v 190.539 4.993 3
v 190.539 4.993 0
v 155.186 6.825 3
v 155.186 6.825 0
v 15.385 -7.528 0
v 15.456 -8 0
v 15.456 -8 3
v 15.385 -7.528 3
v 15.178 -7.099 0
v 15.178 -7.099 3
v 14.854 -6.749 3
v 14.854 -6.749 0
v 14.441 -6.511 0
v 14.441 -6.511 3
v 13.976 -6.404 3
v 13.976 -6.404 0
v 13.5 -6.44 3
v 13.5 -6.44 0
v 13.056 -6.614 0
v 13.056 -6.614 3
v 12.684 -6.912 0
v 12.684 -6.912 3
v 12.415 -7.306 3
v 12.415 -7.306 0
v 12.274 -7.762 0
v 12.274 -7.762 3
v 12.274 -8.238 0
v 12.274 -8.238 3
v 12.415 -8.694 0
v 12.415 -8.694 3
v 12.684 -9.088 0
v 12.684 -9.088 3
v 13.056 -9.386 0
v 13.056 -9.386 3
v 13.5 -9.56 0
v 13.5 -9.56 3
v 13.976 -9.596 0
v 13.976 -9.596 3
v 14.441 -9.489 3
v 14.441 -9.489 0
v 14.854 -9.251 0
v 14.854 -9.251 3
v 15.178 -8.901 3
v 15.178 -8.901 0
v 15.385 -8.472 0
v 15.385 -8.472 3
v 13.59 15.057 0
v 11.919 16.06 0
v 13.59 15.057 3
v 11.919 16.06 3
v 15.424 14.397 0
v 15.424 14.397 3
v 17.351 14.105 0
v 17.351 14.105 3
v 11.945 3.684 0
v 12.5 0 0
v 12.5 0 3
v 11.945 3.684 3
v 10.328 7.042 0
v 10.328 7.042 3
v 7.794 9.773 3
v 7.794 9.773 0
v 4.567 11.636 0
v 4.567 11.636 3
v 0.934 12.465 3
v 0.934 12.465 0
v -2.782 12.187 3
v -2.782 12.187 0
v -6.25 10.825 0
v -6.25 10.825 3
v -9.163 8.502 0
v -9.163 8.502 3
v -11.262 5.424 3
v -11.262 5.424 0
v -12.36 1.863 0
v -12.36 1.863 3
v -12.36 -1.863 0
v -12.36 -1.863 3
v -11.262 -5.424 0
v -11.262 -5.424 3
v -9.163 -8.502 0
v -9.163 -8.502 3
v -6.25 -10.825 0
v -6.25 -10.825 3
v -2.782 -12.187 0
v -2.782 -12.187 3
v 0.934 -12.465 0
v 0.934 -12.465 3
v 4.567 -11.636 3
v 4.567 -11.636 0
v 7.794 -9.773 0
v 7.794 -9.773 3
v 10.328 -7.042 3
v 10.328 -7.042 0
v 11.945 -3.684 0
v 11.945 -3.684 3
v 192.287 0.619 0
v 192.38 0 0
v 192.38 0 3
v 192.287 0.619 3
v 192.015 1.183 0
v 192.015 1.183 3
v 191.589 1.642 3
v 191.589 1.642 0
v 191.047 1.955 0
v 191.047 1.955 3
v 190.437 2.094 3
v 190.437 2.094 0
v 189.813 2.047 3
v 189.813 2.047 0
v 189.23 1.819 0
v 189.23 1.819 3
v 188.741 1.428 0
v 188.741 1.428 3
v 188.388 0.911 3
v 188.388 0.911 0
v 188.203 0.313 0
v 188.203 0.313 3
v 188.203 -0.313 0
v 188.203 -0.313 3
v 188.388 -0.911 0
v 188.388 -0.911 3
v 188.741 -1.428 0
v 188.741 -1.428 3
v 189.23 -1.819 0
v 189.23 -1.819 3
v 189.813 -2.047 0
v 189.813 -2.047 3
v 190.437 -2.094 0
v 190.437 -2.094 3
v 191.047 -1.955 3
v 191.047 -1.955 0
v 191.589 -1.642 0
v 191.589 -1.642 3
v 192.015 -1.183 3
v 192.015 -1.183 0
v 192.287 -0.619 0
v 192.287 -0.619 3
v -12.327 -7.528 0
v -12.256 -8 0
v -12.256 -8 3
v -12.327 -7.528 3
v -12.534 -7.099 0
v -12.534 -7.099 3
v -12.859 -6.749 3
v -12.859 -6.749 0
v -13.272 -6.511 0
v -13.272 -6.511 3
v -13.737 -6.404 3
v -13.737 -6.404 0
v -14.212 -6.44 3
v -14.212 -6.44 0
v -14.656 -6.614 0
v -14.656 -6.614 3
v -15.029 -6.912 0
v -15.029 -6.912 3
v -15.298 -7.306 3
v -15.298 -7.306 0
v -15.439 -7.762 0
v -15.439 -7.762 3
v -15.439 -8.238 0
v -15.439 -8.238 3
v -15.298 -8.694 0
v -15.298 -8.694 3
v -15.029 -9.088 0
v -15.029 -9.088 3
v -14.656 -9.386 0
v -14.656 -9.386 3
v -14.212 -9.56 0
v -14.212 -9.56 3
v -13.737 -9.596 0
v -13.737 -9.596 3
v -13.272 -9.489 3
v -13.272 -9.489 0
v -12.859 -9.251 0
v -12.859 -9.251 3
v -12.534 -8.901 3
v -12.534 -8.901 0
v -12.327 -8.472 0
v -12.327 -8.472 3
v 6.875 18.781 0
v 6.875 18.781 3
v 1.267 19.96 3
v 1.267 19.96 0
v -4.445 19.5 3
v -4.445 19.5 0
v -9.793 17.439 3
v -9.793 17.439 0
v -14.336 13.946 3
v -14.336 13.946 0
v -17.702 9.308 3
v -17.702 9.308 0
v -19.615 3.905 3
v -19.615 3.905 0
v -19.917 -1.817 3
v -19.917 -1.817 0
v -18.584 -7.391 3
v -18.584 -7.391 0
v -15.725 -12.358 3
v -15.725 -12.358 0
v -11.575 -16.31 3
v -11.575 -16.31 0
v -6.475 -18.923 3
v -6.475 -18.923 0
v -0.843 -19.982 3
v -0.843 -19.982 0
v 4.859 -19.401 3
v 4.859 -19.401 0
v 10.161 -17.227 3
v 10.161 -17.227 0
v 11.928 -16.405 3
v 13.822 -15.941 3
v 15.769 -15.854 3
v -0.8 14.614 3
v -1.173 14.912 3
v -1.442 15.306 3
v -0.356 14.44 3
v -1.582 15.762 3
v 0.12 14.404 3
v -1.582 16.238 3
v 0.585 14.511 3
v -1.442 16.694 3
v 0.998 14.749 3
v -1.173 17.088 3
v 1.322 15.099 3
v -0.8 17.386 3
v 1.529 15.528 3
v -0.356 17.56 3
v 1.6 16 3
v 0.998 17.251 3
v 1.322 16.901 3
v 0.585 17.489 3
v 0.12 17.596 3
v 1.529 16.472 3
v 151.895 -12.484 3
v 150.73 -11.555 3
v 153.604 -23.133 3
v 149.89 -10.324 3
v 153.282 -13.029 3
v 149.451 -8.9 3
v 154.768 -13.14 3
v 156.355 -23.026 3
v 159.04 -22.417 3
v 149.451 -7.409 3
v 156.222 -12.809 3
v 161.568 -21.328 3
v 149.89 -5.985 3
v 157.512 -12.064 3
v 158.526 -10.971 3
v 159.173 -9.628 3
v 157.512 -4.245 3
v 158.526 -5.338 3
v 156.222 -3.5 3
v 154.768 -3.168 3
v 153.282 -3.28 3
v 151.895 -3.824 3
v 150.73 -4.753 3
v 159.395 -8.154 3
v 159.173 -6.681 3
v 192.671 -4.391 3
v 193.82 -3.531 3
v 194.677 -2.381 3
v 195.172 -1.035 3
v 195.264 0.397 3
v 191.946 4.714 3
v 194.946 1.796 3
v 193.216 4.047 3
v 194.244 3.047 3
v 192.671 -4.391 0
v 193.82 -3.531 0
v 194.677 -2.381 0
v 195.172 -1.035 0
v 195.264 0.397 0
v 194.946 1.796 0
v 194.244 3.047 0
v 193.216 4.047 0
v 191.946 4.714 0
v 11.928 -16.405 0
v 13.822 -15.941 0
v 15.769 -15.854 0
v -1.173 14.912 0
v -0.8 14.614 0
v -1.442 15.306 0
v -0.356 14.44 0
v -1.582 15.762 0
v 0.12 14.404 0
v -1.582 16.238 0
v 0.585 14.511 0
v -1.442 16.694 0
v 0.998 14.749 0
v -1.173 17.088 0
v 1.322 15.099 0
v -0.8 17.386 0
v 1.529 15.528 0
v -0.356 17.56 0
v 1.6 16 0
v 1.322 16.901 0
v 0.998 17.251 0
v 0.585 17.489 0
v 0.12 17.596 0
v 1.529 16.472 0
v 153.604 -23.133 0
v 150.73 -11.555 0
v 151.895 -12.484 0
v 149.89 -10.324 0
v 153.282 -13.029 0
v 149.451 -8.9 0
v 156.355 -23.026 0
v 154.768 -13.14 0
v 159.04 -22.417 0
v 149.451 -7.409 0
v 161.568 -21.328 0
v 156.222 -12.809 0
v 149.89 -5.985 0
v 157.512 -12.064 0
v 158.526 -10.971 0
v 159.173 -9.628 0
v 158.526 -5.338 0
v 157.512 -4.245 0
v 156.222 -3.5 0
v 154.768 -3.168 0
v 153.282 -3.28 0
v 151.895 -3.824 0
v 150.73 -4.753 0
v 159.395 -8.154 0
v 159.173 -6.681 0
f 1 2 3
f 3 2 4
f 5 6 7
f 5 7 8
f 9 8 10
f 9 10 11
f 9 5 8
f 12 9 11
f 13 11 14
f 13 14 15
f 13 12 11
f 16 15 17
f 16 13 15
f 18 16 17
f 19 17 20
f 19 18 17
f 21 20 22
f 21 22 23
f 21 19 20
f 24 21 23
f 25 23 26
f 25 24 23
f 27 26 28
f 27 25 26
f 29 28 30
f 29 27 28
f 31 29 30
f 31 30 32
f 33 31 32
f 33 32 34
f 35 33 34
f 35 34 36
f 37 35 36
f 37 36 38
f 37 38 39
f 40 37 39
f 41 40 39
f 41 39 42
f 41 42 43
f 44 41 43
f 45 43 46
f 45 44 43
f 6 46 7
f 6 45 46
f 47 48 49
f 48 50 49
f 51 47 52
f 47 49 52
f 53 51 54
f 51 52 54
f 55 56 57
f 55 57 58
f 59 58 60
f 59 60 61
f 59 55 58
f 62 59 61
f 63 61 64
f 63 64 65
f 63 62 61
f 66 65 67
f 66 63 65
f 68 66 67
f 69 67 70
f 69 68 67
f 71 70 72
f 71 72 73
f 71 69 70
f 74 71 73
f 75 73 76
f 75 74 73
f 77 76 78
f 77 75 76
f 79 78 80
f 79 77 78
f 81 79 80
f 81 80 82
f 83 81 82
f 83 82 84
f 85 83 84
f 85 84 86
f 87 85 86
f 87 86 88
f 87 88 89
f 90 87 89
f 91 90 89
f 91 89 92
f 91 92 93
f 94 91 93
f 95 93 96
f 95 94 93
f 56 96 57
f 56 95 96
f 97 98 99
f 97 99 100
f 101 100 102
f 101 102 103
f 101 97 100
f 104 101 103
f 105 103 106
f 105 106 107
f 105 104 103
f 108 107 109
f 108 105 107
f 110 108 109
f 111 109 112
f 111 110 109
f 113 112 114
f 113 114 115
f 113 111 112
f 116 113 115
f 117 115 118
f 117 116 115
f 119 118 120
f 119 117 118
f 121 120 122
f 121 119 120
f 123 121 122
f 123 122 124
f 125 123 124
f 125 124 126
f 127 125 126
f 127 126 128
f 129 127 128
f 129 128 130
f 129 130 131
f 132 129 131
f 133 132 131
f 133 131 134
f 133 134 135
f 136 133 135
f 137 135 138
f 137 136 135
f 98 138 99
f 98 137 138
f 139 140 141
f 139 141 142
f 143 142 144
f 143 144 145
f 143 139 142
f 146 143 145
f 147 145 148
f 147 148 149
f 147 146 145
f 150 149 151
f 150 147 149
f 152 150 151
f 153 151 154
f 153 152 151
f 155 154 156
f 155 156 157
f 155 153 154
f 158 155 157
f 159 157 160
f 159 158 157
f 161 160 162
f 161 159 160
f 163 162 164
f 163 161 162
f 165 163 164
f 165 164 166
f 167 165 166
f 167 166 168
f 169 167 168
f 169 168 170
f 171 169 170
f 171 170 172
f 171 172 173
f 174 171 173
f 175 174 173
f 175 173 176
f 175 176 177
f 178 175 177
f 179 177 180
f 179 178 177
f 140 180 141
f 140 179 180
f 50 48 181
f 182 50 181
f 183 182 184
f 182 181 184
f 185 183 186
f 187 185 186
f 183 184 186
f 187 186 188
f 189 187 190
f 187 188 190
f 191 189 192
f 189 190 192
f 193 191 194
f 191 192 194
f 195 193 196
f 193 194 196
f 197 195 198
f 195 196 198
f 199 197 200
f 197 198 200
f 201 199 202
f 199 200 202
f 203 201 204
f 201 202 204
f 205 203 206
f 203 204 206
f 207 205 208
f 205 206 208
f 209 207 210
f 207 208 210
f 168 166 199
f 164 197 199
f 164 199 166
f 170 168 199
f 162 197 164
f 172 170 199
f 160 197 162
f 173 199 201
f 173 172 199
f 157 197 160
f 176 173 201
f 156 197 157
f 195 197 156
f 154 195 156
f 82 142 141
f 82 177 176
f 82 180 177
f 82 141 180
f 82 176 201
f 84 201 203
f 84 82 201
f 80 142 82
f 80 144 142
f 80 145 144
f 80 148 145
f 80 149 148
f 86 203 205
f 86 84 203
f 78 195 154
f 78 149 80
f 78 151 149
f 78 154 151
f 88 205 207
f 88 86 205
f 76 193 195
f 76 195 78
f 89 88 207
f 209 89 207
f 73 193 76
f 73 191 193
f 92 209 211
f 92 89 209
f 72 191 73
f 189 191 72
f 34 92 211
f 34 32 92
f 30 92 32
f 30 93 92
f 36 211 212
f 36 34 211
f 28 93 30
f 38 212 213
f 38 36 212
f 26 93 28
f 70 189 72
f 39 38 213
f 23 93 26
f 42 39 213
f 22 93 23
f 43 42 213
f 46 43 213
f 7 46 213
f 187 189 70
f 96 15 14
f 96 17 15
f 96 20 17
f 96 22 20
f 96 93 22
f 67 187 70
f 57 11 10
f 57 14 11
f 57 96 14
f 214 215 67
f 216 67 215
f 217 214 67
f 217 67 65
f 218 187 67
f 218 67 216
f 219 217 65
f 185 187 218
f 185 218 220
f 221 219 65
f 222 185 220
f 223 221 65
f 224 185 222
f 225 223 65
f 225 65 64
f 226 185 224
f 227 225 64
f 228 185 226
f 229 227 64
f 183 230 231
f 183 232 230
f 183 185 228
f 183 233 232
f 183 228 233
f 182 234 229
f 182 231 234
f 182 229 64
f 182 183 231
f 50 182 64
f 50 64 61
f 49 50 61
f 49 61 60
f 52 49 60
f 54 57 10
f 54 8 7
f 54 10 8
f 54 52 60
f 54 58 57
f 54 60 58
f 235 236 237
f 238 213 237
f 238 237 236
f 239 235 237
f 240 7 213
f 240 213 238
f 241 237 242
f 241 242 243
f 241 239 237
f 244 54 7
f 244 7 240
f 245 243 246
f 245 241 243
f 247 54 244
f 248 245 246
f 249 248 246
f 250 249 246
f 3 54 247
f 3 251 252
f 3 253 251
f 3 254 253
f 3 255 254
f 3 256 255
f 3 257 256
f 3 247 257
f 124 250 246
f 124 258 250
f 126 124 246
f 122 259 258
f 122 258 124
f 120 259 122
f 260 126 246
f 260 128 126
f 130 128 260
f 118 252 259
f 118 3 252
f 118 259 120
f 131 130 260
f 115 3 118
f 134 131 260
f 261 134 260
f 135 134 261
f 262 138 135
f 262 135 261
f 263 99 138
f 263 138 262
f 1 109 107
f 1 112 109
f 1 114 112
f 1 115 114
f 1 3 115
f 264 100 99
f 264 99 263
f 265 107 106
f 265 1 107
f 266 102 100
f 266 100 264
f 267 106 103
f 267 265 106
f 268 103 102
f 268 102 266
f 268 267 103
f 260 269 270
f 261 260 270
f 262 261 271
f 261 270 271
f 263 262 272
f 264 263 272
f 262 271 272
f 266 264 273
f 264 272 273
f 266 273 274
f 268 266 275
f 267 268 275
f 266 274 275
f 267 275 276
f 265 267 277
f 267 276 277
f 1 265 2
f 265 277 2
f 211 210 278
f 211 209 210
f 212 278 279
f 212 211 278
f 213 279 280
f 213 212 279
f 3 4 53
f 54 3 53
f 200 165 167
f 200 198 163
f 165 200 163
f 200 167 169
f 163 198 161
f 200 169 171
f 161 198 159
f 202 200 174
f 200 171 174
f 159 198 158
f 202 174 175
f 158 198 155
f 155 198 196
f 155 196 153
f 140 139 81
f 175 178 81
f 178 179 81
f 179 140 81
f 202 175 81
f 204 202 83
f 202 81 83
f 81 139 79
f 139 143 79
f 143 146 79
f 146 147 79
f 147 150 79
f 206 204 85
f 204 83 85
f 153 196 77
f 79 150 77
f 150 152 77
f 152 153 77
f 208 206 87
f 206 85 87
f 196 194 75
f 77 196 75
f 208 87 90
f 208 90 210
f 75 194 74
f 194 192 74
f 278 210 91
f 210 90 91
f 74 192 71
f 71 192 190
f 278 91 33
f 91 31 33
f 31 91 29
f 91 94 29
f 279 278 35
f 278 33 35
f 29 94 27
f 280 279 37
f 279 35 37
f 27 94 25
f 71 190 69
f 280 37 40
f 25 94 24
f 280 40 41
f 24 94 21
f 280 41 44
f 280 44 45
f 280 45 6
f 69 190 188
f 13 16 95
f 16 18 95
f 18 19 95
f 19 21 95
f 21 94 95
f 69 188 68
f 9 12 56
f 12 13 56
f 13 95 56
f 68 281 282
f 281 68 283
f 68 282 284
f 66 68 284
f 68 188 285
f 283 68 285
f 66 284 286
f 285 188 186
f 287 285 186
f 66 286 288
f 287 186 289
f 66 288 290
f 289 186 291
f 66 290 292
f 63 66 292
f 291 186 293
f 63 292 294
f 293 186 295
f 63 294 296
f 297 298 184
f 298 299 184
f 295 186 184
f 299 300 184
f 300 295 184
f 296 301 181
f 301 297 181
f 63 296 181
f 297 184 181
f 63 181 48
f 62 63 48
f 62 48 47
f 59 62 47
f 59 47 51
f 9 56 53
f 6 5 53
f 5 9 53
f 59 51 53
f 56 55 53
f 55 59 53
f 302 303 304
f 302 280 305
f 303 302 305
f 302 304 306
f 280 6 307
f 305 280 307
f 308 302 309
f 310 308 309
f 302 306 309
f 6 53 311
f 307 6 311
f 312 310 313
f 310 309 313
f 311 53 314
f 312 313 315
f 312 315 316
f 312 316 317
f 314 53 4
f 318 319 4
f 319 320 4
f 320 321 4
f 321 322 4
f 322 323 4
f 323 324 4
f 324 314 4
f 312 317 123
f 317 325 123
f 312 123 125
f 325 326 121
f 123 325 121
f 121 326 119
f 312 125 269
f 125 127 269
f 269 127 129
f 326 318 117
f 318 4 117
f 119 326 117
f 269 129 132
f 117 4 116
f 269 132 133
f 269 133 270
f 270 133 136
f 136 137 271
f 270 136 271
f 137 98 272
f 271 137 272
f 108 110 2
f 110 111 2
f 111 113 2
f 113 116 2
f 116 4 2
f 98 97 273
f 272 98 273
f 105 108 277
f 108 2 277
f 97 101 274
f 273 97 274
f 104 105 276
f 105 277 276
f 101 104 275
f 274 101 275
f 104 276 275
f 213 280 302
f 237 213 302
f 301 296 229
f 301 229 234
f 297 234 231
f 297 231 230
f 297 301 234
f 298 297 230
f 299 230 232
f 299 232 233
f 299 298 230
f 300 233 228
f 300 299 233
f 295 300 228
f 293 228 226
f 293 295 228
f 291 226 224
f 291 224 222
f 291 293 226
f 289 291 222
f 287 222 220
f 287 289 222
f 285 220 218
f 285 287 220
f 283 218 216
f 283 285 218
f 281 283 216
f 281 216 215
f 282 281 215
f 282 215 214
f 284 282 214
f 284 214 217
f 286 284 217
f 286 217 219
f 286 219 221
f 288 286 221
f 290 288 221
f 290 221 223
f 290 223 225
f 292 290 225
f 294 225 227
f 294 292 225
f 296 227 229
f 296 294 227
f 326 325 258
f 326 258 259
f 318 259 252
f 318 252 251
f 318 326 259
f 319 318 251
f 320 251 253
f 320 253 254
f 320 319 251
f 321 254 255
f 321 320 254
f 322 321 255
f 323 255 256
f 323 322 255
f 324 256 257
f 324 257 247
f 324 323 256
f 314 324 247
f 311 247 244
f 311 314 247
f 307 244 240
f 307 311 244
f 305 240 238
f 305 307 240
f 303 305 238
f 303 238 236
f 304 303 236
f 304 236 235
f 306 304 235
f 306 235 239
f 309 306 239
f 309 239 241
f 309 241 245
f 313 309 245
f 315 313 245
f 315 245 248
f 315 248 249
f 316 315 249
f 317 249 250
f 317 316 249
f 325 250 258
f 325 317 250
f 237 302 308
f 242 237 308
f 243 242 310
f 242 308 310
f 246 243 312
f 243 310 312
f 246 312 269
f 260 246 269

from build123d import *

# Parameters (mm, degrees)
SKETCH_1_R      = 5
SKETCH_1_R_2    = 2.1
SKETCH_1_R_3    = 1.6
SKETCH_1_R_4    = 12.5
EXTRUDE_1_DEPTH = 3
FILLET_1_R      = 10
FILLET_2_R      = 10


with BuildPart() as part:
    # 草图1 → 凸台-拉伸1 (new body)
    with BuildSketch(Plane.XY):
        with BuildLine():
            Line((12.419223494, -15.676826458), (153.603692908, -23.133474126))
            ThreePointArc((153.603692908, -23.133474126), (157.711237696, -22.783135564), (161.568286957, -21.32785817))
            Line((161.568286957, -21.32785817), (192.671157578, -4.391169028))
            ThreePointArc((192.671157578, -4.391169028), (195.155704471, 1.10792866), (190.538680801, 4.993303941))
            Line((190.538680801, 4.993303941), (155.185935535, 6.824771956))
            Line((155.185935535, 6.824771956), (14.001466121, 14.281419623))
            ThreePointArc((14.001466121, 14.281419623), (-19.972164054, 1.054828418), (12.419223494, -15.676826458))
        make_face()
        with Locations((154.394814221, -8.154351085)):
            Circle(SKETCH_1_R, mode=Mode.SUBTRACT)
        with Locations((190.28, 0)):
            Circle(SKETCH_1_R_2, mode=Mode.SUBTRACT)
        with Locations((0, 16)):
            Circle(SKETCH_1_R_3, mode=Mode.SUBTRACT)
        Circle(SKETCH_1_R_4, mode=Mode.SUBTRACT)
        with Locations((13.856406461, -8)):
            Circle(SKETCH_1_R_3, mode=Mode.SUBTRACT)
        with Locations((-13.856406461, -8)):
            Circle(SKETCH_1_R_3, mode=Mode.SUBTRACT)
    extrude(amount=EXTRUDE_1_DEPTH)

    # 圆角1
    fillet_1_edges = [part.edges().sort_by_distance(p)[0] for p in [
        (14.001466121, 14.281419623, 1.5),
    ]]
    fillet(fillet_1_edges, radius=FILLET_1_R)

    # 圆角2
    fillet_2_edges = [part.edges().sort_by_distance(p)[0] for p in [
        (12.419223494, -15.676826458, 1.5),
    ]]
    fillet(fillet_2_edges, radius=FILLET_2_R)


solid = part.part
